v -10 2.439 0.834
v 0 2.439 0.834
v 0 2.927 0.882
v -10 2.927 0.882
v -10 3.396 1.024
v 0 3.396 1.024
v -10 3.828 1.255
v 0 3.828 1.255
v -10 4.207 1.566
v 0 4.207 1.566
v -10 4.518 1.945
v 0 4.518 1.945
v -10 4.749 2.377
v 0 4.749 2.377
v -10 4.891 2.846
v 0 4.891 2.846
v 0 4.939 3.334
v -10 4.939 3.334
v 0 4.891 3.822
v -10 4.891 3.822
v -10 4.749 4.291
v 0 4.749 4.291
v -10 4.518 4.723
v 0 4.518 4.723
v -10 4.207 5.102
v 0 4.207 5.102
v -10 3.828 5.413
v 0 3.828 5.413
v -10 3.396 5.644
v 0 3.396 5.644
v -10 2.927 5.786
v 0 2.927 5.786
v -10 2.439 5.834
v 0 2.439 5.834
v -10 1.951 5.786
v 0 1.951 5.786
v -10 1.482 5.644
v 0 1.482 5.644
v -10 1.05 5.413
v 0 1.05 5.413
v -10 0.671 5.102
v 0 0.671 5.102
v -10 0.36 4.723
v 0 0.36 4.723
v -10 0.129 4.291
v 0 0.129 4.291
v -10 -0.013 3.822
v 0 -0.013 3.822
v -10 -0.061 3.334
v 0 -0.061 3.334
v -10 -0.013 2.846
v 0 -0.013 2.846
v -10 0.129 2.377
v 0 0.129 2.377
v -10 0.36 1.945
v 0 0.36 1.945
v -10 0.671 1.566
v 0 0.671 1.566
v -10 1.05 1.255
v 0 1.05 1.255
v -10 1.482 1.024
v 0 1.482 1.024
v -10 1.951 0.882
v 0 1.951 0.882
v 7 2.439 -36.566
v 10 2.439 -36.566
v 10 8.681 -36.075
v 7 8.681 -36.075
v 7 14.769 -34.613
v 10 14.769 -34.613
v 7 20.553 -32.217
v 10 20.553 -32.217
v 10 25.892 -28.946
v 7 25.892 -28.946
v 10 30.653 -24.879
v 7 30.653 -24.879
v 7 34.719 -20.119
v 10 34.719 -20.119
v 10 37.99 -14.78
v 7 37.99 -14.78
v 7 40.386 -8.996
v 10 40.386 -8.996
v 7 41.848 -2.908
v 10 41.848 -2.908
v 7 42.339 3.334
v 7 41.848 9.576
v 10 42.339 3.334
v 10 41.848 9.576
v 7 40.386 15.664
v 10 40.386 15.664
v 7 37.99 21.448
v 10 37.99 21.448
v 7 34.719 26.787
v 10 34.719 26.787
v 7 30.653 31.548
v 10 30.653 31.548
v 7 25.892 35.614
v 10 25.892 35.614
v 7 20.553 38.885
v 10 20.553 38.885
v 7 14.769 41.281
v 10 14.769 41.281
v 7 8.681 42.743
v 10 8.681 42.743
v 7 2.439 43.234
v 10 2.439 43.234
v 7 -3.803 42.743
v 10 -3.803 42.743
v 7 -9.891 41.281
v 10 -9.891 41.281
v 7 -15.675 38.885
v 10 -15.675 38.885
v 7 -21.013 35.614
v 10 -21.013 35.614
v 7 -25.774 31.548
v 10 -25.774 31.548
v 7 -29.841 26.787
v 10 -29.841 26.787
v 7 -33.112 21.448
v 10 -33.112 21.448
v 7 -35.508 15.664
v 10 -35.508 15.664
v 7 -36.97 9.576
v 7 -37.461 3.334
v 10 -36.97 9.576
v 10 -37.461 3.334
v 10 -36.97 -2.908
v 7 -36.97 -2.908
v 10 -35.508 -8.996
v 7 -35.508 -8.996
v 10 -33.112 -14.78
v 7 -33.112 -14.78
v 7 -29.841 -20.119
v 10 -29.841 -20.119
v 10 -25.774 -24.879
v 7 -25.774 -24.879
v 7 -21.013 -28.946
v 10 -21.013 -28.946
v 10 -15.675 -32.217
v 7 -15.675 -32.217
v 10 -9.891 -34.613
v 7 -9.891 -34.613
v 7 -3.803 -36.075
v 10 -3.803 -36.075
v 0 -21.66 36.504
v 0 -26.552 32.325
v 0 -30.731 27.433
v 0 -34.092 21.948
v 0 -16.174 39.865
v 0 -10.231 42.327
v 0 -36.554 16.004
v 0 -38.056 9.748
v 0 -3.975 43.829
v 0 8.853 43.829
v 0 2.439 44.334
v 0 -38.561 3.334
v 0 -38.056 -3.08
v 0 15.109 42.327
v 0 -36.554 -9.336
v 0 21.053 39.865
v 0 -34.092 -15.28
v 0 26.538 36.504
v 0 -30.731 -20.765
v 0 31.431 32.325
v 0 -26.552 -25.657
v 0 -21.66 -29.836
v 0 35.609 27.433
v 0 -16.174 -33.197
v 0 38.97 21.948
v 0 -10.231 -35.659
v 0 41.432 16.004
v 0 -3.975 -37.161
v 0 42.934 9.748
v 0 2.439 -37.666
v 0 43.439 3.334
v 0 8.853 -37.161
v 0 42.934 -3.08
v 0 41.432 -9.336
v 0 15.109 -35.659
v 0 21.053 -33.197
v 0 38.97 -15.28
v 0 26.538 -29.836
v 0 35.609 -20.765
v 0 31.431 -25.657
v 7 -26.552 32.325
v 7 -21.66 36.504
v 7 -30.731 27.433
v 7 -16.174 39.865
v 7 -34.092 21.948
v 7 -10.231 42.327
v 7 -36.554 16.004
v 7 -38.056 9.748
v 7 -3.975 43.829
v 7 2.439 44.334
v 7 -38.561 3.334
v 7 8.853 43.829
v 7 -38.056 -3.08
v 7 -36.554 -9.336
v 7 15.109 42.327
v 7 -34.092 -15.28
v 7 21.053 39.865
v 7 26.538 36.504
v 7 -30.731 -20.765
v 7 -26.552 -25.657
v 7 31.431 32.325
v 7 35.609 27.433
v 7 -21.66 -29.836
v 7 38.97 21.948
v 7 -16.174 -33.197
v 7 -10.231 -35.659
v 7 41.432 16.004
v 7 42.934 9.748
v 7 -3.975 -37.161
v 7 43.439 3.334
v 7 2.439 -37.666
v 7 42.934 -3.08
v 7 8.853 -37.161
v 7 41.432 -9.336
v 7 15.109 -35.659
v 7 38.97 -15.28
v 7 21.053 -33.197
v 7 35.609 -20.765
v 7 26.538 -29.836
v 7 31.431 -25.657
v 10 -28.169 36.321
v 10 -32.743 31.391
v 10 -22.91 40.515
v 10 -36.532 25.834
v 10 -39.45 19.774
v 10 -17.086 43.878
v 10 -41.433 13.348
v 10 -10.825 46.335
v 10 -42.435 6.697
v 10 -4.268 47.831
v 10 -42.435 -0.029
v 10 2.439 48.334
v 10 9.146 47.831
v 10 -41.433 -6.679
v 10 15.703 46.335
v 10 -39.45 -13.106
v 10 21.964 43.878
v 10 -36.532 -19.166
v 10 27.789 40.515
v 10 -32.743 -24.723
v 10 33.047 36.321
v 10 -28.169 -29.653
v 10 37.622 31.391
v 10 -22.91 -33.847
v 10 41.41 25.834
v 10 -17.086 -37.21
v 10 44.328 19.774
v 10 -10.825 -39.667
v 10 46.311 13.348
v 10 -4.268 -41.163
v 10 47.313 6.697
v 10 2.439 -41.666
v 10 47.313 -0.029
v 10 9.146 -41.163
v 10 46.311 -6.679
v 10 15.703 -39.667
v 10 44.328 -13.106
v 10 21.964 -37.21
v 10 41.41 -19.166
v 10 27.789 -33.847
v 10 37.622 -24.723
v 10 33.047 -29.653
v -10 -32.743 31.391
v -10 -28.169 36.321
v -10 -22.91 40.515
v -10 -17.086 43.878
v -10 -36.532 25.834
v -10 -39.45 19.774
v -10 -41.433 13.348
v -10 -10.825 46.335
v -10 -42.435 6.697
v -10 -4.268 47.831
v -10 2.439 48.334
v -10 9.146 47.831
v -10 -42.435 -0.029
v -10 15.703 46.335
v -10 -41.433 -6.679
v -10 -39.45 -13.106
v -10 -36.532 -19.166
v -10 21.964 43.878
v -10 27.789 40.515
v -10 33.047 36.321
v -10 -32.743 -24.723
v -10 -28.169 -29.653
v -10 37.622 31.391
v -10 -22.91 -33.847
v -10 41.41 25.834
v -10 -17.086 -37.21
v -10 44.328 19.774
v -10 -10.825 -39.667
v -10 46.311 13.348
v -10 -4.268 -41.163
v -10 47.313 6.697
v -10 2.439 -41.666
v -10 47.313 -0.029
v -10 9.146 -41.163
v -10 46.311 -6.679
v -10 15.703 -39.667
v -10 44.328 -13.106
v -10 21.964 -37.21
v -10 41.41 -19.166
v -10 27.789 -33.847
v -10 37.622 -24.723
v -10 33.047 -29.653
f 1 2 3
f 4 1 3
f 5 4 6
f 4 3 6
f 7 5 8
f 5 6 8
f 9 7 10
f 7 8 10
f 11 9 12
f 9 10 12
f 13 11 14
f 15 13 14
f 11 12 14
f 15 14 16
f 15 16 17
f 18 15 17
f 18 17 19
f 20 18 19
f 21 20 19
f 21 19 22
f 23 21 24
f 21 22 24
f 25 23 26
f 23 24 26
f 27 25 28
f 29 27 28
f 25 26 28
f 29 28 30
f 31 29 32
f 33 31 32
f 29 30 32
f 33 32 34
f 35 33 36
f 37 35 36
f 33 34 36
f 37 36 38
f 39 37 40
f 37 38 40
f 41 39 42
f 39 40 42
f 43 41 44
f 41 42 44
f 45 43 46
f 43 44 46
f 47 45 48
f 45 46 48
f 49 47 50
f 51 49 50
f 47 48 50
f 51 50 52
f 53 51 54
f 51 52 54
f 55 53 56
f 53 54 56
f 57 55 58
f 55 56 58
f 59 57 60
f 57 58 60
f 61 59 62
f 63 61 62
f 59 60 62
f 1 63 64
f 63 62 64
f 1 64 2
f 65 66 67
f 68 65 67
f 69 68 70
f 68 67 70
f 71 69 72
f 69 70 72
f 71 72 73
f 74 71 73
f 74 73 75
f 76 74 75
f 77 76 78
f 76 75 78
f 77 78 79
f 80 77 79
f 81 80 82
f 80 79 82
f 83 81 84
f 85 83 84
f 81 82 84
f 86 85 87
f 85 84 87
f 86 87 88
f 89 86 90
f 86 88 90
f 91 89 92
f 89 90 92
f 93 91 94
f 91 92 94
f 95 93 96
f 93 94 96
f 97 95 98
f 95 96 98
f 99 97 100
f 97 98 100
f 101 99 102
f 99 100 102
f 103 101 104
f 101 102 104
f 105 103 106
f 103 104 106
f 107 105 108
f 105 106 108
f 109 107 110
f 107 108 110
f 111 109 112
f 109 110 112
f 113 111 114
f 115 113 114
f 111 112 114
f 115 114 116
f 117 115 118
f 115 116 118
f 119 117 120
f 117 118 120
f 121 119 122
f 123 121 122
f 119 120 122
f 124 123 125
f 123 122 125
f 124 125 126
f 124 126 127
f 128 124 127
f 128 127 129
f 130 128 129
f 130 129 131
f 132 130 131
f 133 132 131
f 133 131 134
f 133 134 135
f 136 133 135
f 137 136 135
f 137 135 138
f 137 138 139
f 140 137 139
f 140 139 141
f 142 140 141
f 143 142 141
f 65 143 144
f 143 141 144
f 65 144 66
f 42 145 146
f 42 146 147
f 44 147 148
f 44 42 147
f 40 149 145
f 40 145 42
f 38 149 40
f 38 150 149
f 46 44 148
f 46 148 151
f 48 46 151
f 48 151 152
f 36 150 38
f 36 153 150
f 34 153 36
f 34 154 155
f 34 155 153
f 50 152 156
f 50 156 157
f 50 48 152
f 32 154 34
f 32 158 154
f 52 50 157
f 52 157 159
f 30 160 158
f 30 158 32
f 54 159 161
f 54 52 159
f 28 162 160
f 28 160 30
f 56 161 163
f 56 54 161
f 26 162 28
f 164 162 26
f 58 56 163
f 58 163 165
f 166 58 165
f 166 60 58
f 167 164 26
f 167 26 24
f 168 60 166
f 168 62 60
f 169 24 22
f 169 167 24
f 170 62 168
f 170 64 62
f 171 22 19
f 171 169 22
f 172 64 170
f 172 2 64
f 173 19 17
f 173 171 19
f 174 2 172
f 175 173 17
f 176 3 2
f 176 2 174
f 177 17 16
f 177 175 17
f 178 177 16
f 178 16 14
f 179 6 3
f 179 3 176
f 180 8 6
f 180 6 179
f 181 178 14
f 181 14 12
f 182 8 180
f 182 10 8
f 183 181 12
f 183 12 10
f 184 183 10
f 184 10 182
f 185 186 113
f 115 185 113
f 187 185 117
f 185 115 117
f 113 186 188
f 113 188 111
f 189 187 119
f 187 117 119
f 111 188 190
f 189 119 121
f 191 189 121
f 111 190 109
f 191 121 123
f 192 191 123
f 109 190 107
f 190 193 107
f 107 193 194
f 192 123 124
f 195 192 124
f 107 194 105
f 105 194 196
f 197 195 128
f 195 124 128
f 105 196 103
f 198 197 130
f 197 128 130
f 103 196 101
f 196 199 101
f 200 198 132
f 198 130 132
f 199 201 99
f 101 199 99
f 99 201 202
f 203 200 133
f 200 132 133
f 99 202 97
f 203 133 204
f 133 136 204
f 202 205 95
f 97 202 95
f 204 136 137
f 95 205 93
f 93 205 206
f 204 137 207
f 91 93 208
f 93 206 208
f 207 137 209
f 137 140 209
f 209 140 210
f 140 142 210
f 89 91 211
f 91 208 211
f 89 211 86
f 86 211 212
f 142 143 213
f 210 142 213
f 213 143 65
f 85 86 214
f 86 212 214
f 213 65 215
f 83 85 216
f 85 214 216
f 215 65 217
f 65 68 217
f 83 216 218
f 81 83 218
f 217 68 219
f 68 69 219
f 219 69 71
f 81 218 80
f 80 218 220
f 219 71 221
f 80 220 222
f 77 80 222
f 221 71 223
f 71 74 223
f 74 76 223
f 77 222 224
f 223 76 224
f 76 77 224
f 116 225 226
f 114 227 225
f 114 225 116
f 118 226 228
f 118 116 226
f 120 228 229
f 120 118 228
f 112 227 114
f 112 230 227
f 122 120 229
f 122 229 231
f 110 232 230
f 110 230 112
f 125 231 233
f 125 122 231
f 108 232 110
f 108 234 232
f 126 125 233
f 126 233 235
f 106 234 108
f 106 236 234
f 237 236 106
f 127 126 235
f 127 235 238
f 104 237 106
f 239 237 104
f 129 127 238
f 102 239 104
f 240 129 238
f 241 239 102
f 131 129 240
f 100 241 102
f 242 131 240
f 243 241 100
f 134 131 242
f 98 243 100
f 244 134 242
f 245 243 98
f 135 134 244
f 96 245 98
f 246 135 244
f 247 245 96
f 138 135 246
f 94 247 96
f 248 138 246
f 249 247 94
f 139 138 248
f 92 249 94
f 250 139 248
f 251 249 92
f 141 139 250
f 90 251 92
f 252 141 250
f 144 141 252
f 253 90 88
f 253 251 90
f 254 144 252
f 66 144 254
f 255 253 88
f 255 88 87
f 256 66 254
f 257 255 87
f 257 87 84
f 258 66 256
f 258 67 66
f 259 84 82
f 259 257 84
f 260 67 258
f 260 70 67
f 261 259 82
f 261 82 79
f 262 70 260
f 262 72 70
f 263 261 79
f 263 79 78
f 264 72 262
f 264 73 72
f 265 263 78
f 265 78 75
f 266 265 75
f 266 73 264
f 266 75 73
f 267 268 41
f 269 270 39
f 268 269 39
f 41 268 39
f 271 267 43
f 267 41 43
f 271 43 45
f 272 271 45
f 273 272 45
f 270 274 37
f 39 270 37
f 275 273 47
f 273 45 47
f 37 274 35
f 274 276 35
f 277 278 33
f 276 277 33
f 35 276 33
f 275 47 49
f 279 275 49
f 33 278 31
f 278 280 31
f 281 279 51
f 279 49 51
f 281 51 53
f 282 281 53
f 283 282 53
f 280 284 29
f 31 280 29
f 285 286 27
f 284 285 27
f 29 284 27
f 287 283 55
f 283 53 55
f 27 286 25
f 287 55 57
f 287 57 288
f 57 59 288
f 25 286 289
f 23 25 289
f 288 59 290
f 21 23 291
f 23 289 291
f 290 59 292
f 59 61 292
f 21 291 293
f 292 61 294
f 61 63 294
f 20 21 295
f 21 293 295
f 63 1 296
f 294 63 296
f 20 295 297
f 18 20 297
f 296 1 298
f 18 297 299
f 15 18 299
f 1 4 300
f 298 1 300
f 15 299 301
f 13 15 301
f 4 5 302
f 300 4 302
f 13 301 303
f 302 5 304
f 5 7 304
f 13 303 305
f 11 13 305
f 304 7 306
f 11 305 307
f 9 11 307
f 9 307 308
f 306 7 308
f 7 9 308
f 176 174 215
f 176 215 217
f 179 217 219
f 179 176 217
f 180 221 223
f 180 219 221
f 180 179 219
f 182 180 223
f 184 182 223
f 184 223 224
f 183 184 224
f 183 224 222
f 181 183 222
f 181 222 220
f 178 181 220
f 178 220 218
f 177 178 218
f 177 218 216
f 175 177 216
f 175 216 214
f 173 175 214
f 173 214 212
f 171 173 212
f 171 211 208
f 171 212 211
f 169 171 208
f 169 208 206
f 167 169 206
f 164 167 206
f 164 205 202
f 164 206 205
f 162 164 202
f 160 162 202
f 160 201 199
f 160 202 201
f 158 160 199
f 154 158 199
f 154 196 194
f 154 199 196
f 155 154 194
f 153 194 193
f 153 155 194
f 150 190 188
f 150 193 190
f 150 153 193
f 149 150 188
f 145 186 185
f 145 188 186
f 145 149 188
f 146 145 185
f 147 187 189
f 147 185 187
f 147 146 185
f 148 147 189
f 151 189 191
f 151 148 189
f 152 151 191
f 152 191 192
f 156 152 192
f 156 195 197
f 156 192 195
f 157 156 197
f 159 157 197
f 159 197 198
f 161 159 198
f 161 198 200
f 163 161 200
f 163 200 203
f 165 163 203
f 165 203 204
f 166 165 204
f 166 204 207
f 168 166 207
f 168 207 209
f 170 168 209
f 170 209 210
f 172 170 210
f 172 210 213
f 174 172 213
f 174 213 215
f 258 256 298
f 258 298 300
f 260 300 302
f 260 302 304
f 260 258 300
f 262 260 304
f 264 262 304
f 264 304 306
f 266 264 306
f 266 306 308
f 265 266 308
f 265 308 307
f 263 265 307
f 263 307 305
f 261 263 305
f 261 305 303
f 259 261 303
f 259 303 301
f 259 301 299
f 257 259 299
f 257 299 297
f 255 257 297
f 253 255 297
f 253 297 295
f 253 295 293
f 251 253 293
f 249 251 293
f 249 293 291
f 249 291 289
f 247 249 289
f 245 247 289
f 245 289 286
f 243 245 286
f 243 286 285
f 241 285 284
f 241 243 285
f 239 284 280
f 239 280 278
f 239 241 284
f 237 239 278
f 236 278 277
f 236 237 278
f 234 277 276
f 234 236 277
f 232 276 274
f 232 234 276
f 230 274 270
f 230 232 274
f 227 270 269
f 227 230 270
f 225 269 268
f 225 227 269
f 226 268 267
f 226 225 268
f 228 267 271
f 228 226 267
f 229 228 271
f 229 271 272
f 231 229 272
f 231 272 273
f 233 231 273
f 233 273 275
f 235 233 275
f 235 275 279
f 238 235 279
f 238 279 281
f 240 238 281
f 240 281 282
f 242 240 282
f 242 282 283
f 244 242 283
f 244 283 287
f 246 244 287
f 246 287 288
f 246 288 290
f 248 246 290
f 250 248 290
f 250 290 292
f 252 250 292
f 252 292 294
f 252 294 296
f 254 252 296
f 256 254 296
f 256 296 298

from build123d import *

# Parameters (mm, degrees)
CROQUIS2_R              = 45
CROQUIS2_R_2            = 41
SALIENTE_EXTRUIR1_DEPTH = 10
CROQUIS3_R              = 45
SALIENTE_EXTRUIR2_DEPTH = 10
CROQUIS4_R              = 45
CROQUIS4_R_2            = 39.9
SALIENTE_EXTRUIR3_DEPTH = 3
CROQUIS5_R              = 2.5
CORTAR_EXTRUIR1_DEPTH   = 10


with BuildPart() as part:
    # Croquis2 → Saliente-Extruir1 (new body)
    with BuildSketch(Plane(origin=(0, 0, 0), x_dir=(0, 0, -1), z_dir=(1, 0, 0))):
        with Locations((-3.334066787, 2.439156595)):
            Circle(CROQUIS2_R)
        with Locations((-3.334066787, 2.439156595)):
            Circle(CROQUIS2_R_2, mode=Mode.SUBTRACT)
    extrude(amount=SALIENTE_EXTRUIR1_DEPTH)

    # Croquis3 → Saliente-Extruir2 (add)
    with BuildSketch(Plane(origin=(0, 0, 0), x_dir=(0, 0, -1), z_dir=(1, 0, 0))):
        with Locations((-3.334066787, 2.439156595)):
            Circle(CROQUIS3_R)
    extrude(amount=-SALIENTE_EXTRUIR2_DEPTH)

    # Croquis4 → Saliente-Extruir3 (add)
    with BuildSketch(Plane(origin=(10, 0, 0), x_dir=(0, 0, -1), z_dir=(1, 0, 0))):
        with Locations((-3.334066787, 2.439156595)):
            Circle(CROQUIS4_R)
        with Locations((-3.334066787, 2.439156595)):
            Circle(CROQUIS4_R_2, mode=Mode.SUBTRACT)
    extrude(amount=-SALIENTE_EXTRUIR3_DEPTH)

    # Croquis5 → Cortar-Extruir1 (cut)
    with BuildSketch(Plane(origin=(0, 0, 0), x_dir=(0, 0, -1), z_dir=(1, 0, 0))):
        with Locations((-3.334066787, 2.439156595)):
            Circle(CROQUIS5_R)
    extrude(amount=-CORTAR_EXTRUIR1_DEPTH, mode=Mode.SUBTRACT)


solid = part.part
